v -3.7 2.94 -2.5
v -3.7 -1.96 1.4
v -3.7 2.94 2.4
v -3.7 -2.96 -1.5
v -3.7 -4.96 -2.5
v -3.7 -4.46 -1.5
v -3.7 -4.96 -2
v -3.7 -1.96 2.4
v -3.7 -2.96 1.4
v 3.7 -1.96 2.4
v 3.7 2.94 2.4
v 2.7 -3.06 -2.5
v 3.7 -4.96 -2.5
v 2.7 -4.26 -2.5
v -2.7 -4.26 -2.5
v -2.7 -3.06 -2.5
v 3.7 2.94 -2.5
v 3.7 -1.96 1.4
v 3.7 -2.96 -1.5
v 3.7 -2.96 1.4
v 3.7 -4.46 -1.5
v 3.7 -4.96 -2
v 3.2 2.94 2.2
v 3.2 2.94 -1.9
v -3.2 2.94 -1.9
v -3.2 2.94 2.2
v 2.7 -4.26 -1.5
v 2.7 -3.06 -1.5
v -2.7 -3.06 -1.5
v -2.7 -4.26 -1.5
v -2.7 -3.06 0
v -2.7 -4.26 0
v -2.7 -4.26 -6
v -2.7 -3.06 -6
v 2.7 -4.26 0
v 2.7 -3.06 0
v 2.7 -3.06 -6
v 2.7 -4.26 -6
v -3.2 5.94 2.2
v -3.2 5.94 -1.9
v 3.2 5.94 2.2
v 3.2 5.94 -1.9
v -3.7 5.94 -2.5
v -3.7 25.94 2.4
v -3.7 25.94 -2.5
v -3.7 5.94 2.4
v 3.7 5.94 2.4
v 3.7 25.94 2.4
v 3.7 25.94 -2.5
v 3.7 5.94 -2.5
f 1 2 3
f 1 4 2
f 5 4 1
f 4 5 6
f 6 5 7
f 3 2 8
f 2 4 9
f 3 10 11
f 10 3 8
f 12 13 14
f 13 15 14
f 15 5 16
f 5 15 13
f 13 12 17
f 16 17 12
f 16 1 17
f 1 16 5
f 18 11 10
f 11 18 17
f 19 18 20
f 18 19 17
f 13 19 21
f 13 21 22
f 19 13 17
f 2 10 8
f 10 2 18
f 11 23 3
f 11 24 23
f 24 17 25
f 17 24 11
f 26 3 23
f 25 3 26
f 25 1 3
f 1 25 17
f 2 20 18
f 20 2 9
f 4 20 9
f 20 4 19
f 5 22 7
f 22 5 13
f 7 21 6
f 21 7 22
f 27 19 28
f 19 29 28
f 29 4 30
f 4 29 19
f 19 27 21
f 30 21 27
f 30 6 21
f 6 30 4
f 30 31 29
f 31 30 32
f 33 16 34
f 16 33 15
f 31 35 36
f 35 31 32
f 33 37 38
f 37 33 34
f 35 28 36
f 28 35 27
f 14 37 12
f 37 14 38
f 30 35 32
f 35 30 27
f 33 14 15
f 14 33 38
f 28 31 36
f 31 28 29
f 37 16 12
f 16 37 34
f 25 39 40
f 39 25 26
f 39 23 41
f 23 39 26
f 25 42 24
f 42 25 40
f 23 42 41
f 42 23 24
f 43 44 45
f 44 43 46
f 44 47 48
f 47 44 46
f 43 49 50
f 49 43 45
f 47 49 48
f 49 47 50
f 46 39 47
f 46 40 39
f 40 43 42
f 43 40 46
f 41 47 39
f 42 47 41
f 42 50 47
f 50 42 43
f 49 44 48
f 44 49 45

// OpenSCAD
N=2;
A=2.4+N*2.5;
rotate([0,0,180])
translate([-A/2,-2.94,-2.5])
{
	cube([A,4.9,4.9]);
	cube([A,5.9,3.9]);
	hull()
	{
		cube([A,7.4,1]);
		cube([A,7.9,0.5]);
	}
	translate([1,6,-3.5])cube([A-2,1.2,6]);
	// Plug
	translate([0.5,-20,0.6])cube([A-1,21,4.1]);
	translate([0,-23,0])cube([A,20,4.9]);
}
